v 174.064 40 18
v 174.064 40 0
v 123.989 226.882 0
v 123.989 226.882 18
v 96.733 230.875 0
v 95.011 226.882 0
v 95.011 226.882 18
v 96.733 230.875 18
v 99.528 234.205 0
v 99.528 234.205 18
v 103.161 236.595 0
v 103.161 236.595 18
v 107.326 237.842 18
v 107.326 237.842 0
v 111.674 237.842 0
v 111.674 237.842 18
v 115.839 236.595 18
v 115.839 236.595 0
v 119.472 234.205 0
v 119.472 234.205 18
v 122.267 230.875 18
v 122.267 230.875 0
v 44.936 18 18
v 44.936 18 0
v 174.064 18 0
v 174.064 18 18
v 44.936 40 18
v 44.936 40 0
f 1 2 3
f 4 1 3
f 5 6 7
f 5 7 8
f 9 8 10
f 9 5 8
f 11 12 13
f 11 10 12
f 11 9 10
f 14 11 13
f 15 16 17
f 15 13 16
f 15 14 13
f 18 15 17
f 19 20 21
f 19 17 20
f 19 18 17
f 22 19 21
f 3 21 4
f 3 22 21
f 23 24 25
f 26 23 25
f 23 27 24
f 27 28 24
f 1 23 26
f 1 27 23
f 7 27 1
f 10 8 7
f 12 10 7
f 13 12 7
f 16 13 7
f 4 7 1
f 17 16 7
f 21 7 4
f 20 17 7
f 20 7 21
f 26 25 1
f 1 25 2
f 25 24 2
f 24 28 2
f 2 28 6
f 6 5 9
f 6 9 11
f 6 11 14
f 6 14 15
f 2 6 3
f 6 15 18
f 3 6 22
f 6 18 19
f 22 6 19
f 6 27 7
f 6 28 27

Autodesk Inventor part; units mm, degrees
ref_plane "YZ Plane" through (0, 0, 0) normal (1, 0, 0) x (0, 1, 0)
ref_plane "XZ Plane" through (0, 0, 0) normal (0, 1, 0) x (-1, 0, 0)
ref_plane "XY Plane" through (0, 0, 0) normal (0, 0, 1) x (1, 0, 0)
sketch "Sketch1" plane through (0, 0, 0) normal (0, 0, 1) x (1, 0, 0)
  line L0 (0, 0) -> (219, 0) construction
  line L1 (219, 0) -> (219, 18) construction
  line L2 (219, 18) -> (0, 18) construction
  line L3 (0, 18) -> (0, 0) construction
  line L4 (44.9362, 18) -> (174.0638, 18)
  line L5 (174.0638, 18) -> (174.0638, 40)
  line L6 (174.0638, 40) -> (44.9362, 40) construction
  line L7 (44.9362, 40) -> (44.9362, 18)
  line L8 (91.5484, 238) -> (127.4516, 238) construction
  arc A0 (123.9889, 226.8823) -> (95.0111, 226.8823) centre (109.5, 223) ccw
  line L9 (109.5, 238) -> (109.5, 292.3651) construction
  line L10 (44.9362, 40) -> (95.0111, 226.8823)
  line L11 (174.0638, 40) -> (123.9889, 226.8823)
  point P0 (109.5, 40)
  point P1 (109.5, 0)
  dimension "d2" = 18
  dimension "d3" = 219
  dimension "d4" = 40
  dimension "d5" = 220
  dimension "d6" = 15
  dimension "d7" = 75
extrude "Extrusion1" add sketch "Sketch1" along normal blind 18
properties part number "CPO-1-support"
